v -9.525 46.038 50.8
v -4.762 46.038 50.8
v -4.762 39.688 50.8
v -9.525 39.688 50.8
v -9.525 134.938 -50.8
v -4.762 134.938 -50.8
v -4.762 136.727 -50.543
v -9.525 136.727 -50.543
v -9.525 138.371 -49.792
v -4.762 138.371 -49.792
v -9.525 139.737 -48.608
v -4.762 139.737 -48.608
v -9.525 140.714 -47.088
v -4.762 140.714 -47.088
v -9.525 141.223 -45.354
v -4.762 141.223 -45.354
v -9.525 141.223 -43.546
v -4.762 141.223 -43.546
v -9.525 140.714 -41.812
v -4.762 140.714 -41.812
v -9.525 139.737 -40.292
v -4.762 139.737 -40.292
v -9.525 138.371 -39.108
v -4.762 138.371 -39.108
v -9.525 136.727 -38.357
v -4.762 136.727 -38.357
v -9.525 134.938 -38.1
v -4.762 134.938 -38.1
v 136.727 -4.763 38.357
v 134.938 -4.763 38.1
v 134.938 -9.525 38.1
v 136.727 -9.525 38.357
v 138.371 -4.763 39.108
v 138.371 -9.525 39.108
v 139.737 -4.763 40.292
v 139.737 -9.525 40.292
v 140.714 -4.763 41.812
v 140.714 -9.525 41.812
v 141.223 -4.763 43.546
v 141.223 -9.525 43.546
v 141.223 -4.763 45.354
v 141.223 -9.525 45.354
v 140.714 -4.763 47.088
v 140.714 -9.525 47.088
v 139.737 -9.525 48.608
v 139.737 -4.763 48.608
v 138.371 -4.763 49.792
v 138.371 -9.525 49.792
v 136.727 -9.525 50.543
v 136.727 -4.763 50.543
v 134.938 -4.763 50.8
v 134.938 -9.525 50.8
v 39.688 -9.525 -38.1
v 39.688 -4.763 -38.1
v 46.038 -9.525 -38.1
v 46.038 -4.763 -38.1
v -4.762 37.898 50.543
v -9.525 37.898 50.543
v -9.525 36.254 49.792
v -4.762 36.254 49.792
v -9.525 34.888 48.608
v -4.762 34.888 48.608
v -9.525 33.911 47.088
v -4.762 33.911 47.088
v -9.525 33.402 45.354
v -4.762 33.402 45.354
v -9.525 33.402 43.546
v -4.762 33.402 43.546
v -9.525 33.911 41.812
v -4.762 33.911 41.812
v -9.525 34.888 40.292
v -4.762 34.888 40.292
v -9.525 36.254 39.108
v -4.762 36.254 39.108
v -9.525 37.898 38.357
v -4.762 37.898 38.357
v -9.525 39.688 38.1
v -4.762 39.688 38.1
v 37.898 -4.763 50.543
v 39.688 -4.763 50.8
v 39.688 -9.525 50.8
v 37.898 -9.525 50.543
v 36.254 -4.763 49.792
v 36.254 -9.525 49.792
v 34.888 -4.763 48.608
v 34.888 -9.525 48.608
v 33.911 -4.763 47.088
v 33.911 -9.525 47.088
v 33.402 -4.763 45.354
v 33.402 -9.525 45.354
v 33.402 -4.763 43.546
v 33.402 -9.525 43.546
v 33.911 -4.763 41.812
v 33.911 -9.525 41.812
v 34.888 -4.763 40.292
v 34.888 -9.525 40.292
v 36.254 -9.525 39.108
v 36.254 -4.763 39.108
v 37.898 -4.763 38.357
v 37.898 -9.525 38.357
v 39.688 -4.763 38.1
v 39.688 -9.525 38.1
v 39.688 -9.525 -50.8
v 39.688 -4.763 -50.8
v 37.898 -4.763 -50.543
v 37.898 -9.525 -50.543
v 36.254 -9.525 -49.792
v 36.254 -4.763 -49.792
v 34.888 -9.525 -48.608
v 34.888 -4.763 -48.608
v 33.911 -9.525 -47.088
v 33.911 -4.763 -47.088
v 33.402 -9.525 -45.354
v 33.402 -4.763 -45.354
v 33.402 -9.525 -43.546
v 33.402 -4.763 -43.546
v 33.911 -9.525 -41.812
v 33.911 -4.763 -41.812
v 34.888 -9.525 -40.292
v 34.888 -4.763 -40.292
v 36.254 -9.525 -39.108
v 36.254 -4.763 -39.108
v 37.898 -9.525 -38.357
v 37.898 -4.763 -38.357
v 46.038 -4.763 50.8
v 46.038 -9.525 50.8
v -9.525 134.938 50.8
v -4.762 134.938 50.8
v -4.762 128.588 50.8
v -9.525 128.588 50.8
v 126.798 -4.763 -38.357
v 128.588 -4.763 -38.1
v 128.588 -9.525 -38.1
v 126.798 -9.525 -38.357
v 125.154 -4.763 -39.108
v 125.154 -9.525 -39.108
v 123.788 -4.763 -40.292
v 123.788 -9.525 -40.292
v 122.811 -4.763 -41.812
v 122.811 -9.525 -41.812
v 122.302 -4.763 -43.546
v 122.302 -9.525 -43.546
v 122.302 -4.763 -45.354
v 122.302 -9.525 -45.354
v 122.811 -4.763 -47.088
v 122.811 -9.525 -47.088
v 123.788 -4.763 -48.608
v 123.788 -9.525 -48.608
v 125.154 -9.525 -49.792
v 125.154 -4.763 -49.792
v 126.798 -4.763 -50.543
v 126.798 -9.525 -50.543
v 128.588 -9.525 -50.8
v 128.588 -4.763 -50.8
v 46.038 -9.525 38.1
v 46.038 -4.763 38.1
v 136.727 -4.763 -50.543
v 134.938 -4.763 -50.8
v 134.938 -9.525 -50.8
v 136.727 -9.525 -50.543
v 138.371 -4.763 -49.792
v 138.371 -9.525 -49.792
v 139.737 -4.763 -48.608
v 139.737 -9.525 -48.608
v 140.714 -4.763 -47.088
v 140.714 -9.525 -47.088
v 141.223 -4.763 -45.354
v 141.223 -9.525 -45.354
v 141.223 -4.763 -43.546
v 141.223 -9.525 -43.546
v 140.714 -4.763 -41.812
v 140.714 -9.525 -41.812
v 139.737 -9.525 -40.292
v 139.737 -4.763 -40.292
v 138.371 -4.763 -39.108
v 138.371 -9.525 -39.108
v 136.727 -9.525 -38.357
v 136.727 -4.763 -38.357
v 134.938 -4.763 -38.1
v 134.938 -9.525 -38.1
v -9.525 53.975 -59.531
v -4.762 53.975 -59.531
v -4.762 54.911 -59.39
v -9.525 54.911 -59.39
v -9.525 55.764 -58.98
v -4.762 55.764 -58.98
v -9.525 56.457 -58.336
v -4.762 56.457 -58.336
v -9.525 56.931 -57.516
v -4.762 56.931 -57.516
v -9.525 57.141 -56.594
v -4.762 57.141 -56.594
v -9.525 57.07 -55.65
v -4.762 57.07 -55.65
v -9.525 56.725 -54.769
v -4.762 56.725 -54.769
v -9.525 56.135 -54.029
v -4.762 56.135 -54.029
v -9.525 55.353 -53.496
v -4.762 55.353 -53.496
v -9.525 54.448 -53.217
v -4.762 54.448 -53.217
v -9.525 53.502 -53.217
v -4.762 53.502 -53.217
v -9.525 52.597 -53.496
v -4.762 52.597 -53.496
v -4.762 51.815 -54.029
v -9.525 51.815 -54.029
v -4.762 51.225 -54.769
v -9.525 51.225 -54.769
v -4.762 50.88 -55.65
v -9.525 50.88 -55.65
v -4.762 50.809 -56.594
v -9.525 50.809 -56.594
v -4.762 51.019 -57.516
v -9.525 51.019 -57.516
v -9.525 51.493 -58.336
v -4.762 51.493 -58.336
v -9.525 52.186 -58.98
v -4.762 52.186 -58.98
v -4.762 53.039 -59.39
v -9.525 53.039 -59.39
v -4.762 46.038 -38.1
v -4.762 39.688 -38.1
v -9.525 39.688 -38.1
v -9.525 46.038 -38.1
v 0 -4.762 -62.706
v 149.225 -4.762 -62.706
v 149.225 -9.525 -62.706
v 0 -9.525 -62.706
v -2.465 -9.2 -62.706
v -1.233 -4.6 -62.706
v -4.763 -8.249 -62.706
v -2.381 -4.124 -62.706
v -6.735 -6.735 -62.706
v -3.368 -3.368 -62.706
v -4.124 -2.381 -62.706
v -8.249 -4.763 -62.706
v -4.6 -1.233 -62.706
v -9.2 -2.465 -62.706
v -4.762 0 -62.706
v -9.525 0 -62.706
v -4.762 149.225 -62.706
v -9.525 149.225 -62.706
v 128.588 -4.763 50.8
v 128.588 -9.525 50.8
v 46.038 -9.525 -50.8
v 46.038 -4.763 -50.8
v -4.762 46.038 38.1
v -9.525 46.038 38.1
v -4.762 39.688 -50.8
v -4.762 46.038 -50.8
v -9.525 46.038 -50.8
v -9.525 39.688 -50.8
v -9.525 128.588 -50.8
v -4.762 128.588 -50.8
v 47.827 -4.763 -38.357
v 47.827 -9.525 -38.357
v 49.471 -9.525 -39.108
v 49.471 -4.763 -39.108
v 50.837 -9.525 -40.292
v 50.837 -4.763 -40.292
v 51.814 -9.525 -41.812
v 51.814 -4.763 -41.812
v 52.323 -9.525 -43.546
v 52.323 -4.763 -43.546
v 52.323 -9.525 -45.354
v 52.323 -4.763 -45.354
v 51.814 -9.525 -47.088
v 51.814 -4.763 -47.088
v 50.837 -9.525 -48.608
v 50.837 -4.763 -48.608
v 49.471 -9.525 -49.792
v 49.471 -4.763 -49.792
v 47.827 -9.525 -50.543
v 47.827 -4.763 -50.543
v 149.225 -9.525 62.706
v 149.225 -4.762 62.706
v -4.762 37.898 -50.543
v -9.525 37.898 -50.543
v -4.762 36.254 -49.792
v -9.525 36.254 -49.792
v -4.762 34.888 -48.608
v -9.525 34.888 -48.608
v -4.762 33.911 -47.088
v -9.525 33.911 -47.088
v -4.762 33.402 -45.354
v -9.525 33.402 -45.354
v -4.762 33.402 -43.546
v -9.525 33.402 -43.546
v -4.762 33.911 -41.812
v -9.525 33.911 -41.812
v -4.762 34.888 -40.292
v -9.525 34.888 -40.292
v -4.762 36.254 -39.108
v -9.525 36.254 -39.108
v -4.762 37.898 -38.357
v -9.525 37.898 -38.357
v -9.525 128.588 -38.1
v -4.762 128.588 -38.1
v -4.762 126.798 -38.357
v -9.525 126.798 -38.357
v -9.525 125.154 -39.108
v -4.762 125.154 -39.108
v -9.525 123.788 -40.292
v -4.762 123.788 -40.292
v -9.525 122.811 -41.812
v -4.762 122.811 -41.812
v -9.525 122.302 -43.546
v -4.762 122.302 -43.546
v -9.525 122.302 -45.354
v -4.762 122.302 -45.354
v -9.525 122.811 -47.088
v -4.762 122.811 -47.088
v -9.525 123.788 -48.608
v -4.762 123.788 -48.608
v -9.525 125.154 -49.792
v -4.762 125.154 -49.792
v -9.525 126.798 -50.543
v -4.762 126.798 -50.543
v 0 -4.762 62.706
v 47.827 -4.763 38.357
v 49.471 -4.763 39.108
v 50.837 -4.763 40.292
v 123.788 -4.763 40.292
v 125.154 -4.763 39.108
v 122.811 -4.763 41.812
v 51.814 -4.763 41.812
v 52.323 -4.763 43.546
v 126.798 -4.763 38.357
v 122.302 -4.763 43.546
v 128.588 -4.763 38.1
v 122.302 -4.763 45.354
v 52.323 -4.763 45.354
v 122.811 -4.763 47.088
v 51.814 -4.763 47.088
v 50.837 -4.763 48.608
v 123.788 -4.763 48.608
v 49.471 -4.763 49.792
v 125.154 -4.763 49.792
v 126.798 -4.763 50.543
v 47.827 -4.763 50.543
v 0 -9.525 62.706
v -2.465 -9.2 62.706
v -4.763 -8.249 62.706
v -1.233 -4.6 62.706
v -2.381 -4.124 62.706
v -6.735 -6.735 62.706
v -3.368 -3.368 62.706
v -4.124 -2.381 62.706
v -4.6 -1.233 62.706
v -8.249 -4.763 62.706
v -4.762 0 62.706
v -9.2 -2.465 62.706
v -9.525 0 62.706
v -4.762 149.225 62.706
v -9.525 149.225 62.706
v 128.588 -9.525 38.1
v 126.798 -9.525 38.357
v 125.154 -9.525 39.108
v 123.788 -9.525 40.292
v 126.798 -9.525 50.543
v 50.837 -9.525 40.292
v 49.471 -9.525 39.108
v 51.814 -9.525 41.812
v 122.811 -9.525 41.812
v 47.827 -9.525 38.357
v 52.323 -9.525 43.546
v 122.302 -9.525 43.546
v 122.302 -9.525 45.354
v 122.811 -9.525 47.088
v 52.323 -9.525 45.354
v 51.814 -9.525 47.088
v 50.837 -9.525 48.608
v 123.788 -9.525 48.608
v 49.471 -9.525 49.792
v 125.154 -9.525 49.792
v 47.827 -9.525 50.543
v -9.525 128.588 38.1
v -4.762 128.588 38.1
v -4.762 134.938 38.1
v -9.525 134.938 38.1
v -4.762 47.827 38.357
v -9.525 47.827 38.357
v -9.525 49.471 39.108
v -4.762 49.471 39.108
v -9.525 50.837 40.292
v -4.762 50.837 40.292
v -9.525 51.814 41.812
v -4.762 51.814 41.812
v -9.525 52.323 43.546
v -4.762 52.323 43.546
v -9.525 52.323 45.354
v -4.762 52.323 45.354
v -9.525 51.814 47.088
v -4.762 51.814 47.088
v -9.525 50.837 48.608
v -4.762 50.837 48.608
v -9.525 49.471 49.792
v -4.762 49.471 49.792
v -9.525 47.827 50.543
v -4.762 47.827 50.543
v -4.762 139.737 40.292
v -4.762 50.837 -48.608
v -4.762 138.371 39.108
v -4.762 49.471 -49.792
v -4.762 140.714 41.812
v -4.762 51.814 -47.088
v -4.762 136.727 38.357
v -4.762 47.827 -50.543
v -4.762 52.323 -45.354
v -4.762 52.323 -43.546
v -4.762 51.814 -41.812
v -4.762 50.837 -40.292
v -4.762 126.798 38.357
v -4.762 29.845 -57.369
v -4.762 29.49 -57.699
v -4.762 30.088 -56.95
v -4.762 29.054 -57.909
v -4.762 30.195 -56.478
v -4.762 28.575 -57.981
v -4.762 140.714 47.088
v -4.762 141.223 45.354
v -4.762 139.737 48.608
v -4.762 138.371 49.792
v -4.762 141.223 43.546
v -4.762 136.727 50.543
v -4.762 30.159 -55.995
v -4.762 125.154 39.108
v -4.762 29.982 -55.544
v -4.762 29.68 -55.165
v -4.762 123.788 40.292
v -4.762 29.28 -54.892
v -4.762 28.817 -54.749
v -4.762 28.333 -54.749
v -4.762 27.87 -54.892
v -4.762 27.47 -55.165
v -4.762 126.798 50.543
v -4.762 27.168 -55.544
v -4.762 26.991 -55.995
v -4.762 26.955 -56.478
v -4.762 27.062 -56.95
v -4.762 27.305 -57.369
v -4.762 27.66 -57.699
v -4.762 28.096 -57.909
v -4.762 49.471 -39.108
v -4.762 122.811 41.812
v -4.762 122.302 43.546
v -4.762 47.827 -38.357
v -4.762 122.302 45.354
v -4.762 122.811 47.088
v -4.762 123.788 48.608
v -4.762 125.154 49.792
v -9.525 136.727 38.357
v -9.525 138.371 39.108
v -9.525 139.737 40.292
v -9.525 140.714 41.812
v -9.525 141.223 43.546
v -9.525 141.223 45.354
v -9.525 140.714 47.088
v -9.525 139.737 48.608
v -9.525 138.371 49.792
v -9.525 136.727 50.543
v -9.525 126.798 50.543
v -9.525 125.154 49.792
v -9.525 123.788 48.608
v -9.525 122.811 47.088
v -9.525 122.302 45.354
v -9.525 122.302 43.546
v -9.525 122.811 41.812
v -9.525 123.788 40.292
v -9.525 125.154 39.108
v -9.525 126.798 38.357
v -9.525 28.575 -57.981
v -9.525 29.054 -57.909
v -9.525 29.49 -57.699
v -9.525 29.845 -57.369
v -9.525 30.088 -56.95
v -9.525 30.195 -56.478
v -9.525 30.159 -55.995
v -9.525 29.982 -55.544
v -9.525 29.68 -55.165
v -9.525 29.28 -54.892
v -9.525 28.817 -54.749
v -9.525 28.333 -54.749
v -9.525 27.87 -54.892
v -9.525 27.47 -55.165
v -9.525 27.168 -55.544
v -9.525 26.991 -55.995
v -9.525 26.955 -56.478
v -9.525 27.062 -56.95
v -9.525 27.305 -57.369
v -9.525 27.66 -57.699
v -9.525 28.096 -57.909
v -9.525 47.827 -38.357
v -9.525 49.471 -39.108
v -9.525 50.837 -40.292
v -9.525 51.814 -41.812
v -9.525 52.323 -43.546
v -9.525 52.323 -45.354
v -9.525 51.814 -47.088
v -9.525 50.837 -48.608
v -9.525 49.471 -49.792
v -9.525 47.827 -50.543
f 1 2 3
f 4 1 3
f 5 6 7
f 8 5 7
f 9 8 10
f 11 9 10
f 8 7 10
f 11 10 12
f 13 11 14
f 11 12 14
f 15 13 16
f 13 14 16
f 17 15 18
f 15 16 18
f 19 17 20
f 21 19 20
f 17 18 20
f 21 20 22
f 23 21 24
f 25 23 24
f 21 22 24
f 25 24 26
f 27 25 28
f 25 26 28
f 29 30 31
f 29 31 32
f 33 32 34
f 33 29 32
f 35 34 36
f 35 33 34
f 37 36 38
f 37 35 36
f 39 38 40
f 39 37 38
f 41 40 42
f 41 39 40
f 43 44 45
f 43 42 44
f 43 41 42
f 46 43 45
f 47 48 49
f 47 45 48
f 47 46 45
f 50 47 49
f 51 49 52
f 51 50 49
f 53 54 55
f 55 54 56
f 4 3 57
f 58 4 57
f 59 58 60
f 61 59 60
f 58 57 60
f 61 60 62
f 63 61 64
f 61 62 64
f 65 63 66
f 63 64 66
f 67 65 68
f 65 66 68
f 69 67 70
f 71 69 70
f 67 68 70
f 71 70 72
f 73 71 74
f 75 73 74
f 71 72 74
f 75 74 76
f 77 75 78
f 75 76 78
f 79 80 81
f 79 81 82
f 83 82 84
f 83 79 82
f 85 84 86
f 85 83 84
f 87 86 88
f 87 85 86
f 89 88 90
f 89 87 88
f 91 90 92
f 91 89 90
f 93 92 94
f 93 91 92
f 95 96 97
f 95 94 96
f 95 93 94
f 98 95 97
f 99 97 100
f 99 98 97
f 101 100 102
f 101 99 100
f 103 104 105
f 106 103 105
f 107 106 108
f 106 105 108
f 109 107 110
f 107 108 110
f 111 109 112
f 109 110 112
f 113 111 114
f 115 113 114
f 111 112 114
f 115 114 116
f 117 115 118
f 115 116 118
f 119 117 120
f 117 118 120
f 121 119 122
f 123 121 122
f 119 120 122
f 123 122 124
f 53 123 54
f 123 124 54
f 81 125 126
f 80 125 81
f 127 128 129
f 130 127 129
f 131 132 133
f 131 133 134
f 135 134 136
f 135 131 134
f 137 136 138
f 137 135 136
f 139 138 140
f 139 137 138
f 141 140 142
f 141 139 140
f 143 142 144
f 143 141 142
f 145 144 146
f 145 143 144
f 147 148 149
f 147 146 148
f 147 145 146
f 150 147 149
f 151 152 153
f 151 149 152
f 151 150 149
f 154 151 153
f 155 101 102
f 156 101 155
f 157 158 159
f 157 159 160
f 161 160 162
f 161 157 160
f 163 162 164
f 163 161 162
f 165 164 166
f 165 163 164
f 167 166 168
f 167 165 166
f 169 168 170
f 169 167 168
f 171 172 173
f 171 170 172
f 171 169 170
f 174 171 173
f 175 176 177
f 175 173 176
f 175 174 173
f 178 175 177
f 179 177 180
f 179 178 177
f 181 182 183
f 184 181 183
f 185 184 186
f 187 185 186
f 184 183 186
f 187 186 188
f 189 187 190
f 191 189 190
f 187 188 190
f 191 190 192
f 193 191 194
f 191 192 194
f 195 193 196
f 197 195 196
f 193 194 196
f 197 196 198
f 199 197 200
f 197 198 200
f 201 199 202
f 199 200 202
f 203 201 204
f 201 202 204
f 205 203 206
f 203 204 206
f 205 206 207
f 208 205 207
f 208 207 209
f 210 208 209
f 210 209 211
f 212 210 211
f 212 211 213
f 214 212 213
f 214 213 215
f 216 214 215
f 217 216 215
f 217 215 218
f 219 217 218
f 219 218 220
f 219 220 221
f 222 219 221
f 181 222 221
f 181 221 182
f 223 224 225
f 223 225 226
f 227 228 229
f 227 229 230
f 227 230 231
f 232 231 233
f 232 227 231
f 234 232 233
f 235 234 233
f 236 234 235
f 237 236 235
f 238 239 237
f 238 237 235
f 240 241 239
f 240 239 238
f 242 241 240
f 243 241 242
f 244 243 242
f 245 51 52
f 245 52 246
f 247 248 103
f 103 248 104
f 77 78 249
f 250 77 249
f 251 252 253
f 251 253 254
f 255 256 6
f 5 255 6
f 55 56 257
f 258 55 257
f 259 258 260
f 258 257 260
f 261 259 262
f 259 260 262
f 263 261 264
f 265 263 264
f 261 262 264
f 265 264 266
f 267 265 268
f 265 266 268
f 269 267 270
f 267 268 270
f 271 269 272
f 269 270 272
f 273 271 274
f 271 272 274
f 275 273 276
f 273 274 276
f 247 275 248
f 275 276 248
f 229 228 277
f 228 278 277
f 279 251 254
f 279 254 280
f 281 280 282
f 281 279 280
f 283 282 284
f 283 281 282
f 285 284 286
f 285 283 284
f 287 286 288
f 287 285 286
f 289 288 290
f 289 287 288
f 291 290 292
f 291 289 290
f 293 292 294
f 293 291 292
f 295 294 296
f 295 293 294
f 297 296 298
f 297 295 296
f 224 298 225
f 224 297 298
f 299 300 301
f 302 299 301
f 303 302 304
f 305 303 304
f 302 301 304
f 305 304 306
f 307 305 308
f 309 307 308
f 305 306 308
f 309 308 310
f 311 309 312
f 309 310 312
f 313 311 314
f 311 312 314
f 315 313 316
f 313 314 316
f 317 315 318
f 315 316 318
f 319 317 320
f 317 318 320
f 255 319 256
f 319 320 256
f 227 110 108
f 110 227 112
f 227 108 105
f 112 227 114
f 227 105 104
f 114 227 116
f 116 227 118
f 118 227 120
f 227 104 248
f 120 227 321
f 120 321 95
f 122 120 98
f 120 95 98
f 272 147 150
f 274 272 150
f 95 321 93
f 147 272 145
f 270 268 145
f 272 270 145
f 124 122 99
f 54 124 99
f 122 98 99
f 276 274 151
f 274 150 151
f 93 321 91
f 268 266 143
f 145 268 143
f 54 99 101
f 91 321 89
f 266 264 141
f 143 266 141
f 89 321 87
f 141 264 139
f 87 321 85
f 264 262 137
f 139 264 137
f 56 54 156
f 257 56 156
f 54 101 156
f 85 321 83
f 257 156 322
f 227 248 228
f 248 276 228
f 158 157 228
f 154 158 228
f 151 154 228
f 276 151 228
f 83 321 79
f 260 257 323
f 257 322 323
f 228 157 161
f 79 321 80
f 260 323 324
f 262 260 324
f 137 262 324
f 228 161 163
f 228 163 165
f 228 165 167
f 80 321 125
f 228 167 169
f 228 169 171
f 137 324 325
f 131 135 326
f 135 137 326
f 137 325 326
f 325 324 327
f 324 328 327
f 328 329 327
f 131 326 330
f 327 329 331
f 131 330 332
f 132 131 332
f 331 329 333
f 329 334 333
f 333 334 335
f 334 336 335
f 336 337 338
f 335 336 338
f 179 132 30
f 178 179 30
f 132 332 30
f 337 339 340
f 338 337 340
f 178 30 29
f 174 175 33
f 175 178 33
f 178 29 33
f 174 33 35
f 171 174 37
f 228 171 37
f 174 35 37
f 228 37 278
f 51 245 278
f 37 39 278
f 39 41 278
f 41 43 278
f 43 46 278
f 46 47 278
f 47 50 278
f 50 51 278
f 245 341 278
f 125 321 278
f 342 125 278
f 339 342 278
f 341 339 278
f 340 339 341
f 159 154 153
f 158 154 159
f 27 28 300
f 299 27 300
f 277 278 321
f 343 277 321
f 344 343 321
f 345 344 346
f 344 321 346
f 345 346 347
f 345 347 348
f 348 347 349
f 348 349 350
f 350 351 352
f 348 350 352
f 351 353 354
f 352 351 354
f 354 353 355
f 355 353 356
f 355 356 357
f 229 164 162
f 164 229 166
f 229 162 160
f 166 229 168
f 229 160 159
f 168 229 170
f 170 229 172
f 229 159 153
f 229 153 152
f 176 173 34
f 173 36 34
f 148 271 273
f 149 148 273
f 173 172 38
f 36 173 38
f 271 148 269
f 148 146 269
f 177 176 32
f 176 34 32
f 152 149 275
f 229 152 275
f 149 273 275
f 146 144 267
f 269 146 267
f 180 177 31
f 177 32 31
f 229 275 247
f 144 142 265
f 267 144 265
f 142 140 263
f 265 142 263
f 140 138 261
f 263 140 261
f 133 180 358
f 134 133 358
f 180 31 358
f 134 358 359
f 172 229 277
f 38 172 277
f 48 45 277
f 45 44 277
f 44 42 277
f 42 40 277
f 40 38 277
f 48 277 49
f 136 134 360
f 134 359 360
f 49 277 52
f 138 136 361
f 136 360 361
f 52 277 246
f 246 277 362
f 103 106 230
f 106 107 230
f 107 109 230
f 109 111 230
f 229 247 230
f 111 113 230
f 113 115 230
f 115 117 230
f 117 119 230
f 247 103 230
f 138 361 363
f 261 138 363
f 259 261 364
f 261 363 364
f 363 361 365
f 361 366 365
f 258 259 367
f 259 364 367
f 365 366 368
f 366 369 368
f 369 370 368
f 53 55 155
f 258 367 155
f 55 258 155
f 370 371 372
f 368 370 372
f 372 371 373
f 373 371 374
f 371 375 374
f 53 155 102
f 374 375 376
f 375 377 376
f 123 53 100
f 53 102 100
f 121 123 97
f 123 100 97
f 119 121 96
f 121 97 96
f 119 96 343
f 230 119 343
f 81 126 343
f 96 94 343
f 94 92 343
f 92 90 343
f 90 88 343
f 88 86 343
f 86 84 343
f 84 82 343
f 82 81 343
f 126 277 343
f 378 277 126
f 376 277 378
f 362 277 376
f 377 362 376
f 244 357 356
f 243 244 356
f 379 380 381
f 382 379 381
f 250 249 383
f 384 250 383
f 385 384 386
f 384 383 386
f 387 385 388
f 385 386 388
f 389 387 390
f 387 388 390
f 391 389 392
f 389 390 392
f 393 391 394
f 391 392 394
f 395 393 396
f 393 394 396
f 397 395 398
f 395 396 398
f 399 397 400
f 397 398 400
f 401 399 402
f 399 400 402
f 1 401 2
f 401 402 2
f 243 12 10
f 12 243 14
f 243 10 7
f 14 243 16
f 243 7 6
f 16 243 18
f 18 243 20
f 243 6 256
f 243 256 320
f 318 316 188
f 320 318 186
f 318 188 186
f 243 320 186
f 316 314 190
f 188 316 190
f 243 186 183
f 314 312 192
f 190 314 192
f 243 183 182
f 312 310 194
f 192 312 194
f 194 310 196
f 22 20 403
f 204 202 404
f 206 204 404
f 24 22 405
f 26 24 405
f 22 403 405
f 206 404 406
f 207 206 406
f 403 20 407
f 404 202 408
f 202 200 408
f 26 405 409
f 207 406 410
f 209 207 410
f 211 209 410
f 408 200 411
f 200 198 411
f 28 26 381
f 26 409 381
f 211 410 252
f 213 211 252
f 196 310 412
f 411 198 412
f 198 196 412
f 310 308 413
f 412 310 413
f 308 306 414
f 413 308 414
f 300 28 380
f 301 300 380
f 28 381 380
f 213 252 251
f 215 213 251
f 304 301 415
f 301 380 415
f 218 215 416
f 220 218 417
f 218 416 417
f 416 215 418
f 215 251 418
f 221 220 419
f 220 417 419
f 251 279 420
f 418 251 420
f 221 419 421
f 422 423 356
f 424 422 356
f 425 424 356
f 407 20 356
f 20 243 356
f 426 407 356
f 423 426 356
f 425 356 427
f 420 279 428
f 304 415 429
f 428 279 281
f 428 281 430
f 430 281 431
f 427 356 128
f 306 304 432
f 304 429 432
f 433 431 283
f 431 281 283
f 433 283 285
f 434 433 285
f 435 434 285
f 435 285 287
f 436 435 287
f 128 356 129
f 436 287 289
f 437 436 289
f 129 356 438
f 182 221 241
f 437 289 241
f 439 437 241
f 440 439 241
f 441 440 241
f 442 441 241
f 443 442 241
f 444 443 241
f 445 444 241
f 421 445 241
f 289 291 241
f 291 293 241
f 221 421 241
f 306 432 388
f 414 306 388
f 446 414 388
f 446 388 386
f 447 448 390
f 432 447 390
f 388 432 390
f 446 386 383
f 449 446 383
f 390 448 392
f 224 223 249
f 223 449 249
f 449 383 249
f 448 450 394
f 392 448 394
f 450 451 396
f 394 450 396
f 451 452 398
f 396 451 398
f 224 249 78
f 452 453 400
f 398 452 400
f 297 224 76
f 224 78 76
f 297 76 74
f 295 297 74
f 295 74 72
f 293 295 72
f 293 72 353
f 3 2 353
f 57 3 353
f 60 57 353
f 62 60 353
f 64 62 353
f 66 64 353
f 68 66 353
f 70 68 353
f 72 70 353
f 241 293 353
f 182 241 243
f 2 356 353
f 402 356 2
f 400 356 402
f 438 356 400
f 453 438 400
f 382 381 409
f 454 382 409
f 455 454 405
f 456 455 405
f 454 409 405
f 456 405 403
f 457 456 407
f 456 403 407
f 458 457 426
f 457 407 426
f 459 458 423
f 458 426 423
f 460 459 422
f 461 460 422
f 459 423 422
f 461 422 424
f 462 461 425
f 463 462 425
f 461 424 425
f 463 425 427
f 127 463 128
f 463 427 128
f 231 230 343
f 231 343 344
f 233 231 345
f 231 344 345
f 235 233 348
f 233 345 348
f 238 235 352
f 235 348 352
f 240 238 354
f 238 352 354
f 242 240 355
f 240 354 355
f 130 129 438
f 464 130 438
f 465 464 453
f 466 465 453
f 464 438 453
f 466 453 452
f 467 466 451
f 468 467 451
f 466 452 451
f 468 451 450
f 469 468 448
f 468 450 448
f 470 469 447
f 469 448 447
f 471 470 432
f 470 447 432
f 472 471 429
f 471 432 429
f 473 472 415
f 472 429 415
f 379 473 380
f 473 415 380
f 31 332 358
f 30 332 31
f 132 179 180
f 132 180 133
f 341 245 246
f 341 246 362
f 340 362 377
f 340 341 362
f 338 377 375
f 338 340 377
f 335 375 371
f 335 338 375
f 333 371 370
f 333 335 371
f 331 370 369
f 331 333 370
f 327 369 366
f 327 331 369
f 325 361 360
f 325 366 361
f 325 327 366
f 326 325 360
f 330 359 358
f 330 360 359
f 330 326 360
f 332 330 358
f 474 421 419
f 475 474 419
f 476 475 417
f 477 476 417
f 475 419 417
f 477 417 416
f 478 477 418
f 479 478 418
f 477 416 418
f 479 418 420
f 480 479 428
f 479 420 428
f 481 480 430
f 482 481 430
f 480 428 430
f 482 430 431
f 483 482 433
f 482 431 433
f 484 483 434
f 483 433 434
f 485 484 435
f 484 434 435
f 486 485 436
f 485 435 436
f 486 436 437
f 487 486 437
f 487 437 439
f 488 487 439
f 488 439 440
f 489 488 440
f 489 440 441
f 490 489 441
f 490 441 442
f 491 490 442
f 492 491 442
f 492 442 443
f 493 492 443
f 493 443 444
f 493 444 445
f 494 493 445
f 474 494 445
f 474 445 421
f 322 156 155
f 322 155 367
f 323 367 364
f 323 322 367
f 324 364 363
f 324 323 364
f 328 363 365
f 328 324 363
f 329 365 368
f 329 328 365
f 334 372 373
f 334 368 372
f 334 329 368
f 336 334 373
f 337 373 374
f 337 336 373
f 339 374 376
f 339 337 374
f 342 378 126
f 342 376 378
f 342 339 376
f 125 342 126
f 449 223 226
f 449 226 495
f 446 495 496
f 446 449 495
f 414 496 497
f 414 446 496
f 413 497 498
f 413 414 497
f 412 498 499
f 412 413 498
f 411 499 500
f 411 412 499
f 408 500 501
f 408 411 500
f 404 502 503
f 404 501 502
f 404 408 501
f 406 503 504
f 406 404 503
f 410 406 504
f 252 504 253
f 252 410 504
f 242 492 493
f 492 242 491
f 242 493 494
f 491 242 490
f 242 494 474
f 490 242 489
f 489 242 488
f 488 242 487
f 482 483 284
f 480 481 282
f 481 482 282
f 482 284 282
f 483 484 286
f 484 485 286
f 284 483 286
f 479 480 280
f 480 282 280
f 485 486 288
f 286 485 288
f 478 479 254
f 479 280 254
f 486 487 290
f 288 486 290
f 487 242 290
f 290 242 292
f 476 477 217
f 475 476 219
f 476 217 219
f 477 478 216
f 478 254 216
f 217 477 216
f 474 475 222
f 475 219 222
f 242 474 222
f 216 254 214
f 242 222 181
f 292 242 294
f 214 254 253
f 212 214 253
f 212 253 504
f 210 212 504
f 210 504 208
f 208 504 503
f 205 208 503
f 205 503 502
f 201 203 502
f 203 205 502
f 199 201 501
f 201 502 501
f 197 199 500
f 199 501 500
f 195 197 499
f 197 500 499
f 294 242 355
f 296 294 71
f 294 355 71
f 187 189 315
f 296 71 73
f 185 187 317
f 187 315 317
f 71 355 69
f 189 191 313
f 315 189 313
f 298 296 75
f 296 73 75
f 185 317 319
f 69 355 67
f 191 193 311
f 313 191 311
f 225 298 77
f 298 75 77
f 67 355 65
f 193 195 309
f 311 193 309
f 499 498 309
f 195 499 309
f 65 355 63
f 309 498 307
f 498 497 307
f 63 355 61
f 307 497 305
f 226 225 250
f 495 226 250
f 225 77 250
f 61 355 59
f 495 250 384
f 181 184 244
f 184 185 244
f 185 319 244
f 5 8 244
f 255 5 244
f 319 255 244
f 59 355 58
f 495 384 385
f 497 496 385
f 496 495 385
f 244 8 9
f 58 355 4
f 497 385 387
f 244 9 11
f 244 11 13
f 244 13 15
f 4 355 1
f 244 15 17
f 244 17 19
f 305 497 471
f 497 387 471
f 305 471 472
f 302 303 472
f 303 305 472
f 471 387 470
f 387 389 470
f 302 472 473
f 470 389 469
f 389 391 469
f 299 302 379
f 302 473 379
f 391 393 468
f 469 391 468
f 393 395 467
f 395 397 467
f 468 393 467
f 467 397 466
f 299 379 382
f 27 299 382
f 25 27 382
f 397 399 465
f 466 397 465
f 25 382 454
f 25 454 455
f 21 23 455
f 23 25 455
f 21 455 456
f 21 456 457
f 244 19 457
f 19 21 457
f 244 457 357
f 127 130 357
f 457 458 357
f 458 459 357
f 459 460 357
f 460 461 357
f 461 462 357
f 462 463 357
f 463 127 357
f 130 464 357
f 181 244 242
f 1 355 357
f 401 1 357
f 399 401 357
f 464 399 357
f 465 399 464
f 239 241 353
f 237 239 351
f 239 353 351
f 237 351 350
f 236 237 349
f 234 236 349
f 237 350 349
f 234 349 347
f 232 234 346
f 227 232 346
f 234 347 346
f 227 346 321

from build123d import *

# Parameters (mm, degrees)
BOSS_EXTRUDE1_DEPTH = 62.70625
CUT_EXTRUDE1_DEPTH  = 224.410663511
SKETCH3_R           = 1.625
SKETCH3_R_2         = 3.175
CUT_EXTRUDE2_DEPTH  = 224.410663511


with BuildPart() as part:
    # Sketch1 → Boss-Extrude1 (new, symmetric)
    with BuildSketch(Plane.XY):
        with BuildLine():
            Line((-9.525, 149.225), (-4.7625, 149.225))
            Line((-4.7625, 149.225), (-4.7625, 0))
            ThreePointArc((-4.7625, 0), (-3.367596045, -3.367596045), (0, -4.7625))
            Line((0, -4.7625), (149.225, -4.7625))
            Line((149.225, -4.7625), (149.225, -9.525))
            Line((149.225, -9.525), (0, -9.525))
            ThreePointArc((0, -9.525), (-6.735192091, -6.735192091), (-9.525, 0))
            Line((-9.525, 0), (-9.525, 149.225))
        make_face()
    extrude(amount=BOSS_EXTRUDE1_DEPTH, both=True)

    # Sketch2 → Cut-Extrude1 (cut, through all)
    with BuildSketch(Plane(origin=(-4.7625, 0, 0), x_dir=(0, 0, -1), z_dir=(1, 0, 0))):
        with BuildLine():
            Line((-50.8, 134.9375), (-50.8, 128.5875))
            ThreePointArc((-50.8, 128.5875), (-44.45, 122.2375), (-38.1, 128.5875))
            Line((-38.1, 128.5875), (-38.1, 134.9375))
            ThreePointArc((-38.1, 134.9375), (-44.45, 141.2875), (-50.8, 134.9375))
        make_face()
        with BuildLine():
            Line((-50.8, 46.0375), (-50.8, 39.6875))
            ThreePointArc((-50.8, 39.6875), (-44.45, 33.3375), (-38.1, 39.6875))
            Line((-38.1, 39.6875), (-38.1, 46.0375))
            ThreePointArc((-38.1, 46.0375), (-44.45, 52.3875), (-50.8, 46.0375))
        make_face()
        with BuildLine():
            Line((38.1, 39.6875), (38.1, 46.0375))
            ThreePointArc((38.1, 46.0375), (44.45, 52.3875), (50.8, 46.0375))
            Line((50.8, 46.0375), (50.8, 39.6875))
            ThreePointArc((50.8, 39.6875), (44.45, 33.3375), (38.1, 39.6875))
        make_face()
        with BuildLine():
            Line((38.1, 134.9375), (38.1, 128.5875))
            ThreePointArc((38.1, 128.5875), (44.45, 122.2375), (50.8, 128.5875))
            Line((50.8, 128.5875), (50.8, 134.9375))
            ThreePointArc((50.8, 134.9375), (44.45, 141.2875), (38.1, 134.9375))
        make_face()
    cut_extrude1 = extrude(amount=-CUT_EXTRUDE1_DEPTH, mode=Mode.SUBTRACT)

    # Mirror1: Cut-Extrude1 across plane
    add(cut_extrude1.mirror(Plane(origin=(0, 0, 0), x_dir=(0, 0, 1), z_dir=(0.7071067811865475, -0.7071067811865476, 0))), mode=Mode.SUBTRACT)

    # Sketch3 → Cut-Extrude2 (cut, through all)
    with BuildSketch(Plane(origin=(-4.7625, 0, 0), x_dir=(0, 0, -1), z_dir=(1, 0, 0))):
        with Locations((56.35625, 28.575)):
            Circle(SKETCH3_R)
        with Locations((56.35625, 53.975)):
            Circle(SKETCH3_R_2)
    extrude(amount=-CUT_EXTRUDE2_DEPTH, mode=Mode.SUBTRACT)


solid = part.part
